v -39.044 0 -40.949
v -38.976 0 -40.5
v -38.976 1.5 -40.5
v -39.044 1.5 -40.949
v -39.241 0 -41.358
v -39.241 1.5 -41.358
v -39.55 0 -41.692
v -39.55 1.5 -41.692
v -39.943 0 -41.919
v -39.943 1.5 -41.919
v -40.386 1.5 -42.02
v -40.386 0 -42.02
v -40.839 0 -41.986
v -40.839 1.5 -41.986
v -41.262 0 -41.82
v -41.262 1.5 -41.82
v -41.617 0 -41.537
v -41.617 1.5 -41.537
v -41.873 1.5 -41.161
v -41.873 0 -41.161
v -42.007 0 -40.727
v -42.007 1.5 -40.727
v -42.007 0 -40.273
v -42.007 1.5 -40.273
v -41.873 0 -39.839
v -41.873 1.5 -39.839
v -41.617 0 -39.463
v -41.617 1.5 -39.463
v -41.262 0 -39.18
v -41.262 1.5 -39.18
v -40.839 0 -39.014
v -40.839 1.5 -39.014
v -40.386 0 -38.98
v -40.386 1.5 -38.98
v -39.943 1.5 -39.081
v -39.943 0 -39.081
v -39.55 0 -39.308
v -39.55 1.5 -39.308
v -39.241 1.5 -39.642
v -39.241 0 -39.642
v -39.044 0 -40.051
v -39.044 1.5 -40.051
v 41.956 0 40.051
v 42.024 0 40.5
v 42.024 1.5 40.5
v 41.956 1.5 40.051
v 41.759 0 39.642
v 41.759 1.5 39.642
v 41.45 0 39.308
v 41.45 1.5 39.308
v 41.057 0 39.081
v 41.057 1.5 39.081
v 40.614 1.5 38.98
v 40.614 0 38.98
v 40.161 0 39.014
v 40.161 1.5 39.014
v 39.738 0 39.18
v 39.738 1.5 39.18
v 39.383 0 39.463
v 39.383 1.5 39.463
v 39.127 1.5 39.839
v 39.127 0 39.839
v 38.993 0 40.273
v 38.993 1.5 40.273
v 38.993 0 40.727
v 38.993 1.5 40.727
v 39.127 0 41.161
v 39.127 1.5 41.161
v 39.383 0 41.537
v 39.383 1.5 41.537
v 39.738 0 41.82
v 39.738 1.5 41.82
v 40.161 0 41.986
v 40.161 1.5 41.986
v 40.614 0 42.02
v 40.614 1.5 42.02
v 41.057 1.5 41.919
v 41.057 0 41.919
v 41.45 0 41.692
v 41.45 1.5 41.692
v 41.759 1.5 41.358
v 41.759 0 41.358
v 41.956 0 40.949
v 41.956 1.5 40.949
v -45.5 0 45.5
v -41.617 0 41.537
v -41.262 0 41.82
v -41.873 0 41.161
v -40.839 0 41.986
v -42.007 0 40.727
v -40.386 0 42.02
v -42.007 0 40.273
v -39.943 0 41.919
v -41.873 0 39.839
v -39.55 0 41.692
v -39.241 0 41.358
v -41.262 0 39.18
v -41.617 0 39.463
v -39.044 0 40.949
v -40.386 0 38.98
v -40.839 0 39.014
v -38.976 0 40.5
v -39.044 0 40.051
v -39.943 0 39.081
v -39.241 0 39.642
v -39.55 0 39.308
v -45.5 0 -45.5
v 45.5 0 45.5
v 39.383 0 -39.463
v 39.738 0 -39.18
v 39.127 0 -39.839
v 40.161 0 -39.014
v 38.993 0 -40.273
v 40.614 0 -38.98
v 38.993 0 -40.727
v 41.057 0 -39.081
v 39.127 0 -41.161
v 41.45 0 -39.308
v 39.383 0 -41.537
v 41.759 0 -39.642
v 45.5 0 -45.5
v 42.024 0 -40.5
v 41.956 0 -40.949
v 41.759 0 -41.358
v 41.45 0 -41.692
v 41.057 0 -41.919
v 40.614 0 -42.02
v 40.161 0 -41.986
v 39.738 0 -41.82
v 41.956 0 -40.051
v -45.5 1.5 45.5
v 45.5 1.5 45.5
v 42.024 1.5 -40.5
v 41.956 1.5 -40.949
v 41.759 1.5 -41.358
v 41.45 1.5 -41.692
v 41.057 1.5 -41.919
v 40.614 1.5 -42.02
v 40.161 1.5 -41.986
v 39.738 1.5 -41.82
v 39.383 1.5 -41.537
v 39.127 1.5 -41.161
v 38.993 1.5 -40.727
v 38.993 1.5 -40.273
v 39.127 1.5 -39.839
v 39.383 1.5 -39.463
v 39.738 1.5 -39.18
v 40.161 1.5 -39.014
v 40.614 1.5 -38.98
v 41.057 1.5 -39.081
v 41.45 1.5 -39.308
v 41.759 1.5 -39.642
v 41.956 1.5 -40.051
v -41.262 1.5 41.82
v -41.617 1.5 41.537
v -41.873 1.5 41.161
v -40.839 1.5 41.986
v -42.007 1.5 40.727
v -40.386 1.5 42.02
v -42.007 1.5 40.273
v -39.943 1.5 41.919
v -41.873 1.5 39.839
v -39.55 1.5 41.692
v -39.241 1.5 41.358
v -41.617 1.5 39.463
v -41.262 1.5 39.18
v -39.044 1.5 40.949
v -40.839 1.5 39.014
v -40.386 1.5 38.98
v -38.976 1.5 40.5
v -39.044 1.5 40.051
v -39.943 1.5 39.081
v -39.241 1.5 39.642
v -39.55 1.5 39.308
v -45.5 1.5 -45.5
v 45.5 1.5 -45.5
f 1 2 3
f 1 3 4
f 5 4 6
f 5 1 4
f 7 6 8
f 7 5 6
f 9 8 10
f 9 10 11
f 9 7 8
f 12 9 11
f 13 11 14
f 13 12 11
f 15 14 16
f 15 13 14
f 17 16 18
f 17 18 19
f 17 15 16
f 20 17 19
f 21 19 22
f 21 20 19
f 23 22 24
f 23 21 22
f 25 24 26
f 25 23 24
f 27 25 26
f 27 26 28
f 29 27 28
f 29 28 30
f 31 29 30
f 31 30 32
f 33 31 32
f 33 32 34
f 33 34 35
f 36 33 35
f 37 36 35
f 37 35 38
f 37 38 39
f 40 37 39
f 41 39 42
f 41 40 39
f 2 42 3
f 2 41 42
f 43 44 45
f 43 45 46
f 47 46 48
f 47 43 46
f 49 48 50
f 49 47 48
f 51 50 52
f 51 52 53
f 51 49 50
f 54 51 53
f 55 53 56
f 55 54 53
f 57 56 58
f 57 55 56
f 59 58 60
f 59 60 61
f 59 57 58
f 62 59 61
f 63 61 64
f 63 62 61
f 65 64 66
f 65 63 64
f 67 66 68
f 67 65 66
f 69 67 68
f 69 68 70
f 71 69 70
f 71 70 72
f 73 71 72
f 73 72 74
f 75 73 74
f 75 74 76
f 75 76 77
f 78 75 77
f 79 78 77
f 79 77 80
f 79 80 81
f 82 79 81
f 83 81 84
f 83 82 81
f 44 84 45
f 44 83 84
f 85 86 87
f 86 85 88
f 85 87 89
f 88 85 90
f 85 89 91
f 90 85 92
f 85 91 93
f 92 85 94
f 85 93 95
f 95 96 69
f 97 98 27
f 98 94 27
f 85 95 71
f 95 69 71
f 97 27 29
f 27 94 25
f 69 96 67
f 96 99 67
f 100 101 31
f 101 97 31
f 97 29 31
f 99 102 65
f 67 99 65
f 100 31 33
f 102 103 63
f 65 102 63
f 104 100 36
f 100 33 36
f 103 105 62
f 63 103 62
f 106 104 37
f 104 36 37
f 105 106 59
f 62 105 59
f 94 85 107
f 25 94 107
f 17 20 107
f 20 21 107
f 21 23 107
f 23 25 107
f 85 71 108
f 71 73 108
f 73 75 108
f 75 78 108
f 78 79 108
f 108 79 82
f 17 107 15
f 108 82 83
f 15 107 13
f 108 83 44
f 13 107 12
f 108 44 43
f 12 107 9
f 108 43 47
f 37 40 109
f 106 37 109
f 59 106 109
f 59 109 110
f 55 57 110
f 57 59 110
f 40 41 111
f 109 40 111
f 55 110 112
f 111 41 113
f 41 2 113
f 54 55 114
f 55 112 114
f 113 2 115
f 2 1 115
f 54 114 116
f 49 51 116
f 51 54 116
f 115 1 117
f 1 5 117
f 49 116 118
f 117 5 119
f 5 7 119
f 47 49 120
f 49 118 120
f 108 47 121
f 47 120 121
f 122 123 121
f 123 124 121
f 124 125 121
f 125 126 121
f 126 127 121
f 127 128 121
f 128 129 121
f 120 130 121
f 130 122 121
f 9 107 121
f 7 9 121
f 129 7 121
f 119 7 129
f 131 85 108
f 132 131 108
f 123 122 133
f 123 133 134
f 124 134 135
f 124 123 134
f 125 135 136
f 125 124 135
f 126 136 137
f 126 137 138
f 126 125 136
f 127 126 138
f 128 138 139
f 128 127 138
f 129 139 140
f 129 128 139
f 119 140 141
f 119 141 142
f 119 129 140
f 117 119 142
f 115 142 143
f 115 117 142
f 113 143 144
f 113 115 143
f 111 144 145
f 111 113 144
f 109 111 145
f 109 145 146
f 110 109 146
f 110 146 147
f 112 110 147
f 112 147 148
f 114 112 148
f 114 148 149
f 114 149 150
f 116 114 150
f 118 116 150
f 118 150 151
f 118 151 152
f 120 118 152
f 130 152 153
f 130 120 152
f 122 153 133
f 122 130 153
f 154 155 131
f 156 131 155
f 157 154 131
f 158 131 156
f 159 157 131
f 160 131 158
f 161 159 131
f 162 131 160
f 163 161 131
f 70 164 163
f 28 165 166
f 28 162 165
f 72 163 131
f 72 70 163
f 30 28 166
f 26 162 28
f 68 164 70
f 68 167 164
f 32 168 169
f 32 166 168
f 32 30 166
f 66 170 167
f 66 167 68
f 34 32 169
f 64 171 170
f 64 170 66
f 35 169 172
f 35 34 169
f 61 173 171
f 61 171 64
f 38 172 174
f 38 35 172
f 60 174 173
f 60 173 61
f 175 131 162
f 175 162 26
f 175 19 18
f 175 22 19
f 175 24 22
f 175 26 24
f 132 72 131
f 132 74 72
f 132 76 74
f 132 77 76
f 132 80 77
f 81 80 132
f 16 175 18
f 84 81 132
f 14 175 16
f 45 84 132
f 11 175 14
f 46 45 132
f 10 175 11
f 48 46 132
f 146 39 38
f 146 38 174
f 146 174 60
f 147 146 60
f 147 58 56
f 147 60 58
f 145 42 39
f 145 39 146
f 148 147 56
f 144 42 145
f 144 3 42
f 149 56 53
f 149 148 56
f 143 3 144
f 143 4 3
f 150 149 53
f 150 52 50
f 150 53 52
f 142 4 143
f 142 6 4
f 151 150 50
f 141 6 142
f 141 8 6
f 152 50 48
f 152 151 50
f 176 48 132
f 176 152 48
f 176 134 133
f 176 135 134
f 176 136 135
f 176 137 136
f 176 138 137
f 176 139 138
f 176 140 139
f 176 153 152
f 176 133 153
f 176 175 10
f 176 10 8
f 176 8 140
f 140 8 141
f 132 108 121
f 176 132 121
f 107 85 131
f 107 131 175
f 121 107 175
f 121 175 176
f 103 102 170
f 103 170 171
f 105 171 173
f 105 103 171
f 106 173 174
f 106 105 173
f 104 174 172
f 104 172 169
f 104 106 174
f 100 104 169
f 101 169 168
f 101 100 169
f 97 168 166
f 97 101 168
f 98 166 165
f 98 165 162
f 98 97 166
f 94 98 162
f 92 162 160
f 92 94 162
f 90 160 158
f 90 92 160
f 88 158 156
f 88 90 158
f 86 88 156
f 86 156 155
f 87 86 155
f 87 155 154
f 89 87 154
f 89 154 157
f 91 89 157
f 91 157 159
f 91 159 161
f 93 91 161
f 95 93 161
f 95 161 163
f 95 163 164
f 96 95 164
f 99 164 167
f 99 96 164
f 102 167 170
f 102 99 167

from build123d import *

# Parameters (mm, degrees)
SKETCH1_W           = 91
SKETCH1_H           = 91
SKETCH1_R           = 3.175
SKETCH1_R_2         = 1.524
BOSS_EXTRUDE1_DEPTH = 1.5


with BuildPart() as part:
    # Sketch1 → Boss-Extrude1 (new body)
    with BuildSketch(Plane(origin=(0, 0, 0), x_dir=(1, 0, 0), z_dir=(0, 1, 0))):
        Rectangle(SKETCH1_W, SKETCH1_H)
        with Locations((-40.5, -40.5)):
            Circle(SKETCH1_R, mode=Mode.SUBTRACT)
        with Locations((40.5, -40.5)):
            Circle(SKETCH1_R, mode=Mode.SUBTRACT)
        with Locations((40.5, 40.5)):
            Circle(SKETCH1_R, mode=Mode.SUBTRACT)
        with Locations((-40.5, 40.5)):
            Circle(SKETCH1_R, mode=Mode.SUBTRACT)
        with Locations((-40.5, -40.5)):
            Circle(SKETCH1_R)
        with Locations((-40.5, -40.5)):
            Circle(SKETCH1_R_2, mode=Mode.SUBTRACT)
        with Locations((-40.5, 40.5)):
            Circle(SKETCH1_R)
        with Locations((-40.5, 40.5)):
            Circle(SKETCH1_R_2, mode=Mode.SUBTRACT)
        with Locations((40.5, 40.5)):
            Circle(SKETCH1_R)
        with Locations((40.5, 40.5)):
            Circle(SKETCH1_R_2, mode=Mode.SUBTRACT)
        with Locations((40.5, -40.5)):
            Circle(SKETCH1_R)
        with Locations((40.5, -40.5)):
            Circle(SKETCH1_R_2, mode=Mode.SUBTRACT)
    extrude(amount=BOSS_EXTRUDE1_DEPTH)


solid = part.part
